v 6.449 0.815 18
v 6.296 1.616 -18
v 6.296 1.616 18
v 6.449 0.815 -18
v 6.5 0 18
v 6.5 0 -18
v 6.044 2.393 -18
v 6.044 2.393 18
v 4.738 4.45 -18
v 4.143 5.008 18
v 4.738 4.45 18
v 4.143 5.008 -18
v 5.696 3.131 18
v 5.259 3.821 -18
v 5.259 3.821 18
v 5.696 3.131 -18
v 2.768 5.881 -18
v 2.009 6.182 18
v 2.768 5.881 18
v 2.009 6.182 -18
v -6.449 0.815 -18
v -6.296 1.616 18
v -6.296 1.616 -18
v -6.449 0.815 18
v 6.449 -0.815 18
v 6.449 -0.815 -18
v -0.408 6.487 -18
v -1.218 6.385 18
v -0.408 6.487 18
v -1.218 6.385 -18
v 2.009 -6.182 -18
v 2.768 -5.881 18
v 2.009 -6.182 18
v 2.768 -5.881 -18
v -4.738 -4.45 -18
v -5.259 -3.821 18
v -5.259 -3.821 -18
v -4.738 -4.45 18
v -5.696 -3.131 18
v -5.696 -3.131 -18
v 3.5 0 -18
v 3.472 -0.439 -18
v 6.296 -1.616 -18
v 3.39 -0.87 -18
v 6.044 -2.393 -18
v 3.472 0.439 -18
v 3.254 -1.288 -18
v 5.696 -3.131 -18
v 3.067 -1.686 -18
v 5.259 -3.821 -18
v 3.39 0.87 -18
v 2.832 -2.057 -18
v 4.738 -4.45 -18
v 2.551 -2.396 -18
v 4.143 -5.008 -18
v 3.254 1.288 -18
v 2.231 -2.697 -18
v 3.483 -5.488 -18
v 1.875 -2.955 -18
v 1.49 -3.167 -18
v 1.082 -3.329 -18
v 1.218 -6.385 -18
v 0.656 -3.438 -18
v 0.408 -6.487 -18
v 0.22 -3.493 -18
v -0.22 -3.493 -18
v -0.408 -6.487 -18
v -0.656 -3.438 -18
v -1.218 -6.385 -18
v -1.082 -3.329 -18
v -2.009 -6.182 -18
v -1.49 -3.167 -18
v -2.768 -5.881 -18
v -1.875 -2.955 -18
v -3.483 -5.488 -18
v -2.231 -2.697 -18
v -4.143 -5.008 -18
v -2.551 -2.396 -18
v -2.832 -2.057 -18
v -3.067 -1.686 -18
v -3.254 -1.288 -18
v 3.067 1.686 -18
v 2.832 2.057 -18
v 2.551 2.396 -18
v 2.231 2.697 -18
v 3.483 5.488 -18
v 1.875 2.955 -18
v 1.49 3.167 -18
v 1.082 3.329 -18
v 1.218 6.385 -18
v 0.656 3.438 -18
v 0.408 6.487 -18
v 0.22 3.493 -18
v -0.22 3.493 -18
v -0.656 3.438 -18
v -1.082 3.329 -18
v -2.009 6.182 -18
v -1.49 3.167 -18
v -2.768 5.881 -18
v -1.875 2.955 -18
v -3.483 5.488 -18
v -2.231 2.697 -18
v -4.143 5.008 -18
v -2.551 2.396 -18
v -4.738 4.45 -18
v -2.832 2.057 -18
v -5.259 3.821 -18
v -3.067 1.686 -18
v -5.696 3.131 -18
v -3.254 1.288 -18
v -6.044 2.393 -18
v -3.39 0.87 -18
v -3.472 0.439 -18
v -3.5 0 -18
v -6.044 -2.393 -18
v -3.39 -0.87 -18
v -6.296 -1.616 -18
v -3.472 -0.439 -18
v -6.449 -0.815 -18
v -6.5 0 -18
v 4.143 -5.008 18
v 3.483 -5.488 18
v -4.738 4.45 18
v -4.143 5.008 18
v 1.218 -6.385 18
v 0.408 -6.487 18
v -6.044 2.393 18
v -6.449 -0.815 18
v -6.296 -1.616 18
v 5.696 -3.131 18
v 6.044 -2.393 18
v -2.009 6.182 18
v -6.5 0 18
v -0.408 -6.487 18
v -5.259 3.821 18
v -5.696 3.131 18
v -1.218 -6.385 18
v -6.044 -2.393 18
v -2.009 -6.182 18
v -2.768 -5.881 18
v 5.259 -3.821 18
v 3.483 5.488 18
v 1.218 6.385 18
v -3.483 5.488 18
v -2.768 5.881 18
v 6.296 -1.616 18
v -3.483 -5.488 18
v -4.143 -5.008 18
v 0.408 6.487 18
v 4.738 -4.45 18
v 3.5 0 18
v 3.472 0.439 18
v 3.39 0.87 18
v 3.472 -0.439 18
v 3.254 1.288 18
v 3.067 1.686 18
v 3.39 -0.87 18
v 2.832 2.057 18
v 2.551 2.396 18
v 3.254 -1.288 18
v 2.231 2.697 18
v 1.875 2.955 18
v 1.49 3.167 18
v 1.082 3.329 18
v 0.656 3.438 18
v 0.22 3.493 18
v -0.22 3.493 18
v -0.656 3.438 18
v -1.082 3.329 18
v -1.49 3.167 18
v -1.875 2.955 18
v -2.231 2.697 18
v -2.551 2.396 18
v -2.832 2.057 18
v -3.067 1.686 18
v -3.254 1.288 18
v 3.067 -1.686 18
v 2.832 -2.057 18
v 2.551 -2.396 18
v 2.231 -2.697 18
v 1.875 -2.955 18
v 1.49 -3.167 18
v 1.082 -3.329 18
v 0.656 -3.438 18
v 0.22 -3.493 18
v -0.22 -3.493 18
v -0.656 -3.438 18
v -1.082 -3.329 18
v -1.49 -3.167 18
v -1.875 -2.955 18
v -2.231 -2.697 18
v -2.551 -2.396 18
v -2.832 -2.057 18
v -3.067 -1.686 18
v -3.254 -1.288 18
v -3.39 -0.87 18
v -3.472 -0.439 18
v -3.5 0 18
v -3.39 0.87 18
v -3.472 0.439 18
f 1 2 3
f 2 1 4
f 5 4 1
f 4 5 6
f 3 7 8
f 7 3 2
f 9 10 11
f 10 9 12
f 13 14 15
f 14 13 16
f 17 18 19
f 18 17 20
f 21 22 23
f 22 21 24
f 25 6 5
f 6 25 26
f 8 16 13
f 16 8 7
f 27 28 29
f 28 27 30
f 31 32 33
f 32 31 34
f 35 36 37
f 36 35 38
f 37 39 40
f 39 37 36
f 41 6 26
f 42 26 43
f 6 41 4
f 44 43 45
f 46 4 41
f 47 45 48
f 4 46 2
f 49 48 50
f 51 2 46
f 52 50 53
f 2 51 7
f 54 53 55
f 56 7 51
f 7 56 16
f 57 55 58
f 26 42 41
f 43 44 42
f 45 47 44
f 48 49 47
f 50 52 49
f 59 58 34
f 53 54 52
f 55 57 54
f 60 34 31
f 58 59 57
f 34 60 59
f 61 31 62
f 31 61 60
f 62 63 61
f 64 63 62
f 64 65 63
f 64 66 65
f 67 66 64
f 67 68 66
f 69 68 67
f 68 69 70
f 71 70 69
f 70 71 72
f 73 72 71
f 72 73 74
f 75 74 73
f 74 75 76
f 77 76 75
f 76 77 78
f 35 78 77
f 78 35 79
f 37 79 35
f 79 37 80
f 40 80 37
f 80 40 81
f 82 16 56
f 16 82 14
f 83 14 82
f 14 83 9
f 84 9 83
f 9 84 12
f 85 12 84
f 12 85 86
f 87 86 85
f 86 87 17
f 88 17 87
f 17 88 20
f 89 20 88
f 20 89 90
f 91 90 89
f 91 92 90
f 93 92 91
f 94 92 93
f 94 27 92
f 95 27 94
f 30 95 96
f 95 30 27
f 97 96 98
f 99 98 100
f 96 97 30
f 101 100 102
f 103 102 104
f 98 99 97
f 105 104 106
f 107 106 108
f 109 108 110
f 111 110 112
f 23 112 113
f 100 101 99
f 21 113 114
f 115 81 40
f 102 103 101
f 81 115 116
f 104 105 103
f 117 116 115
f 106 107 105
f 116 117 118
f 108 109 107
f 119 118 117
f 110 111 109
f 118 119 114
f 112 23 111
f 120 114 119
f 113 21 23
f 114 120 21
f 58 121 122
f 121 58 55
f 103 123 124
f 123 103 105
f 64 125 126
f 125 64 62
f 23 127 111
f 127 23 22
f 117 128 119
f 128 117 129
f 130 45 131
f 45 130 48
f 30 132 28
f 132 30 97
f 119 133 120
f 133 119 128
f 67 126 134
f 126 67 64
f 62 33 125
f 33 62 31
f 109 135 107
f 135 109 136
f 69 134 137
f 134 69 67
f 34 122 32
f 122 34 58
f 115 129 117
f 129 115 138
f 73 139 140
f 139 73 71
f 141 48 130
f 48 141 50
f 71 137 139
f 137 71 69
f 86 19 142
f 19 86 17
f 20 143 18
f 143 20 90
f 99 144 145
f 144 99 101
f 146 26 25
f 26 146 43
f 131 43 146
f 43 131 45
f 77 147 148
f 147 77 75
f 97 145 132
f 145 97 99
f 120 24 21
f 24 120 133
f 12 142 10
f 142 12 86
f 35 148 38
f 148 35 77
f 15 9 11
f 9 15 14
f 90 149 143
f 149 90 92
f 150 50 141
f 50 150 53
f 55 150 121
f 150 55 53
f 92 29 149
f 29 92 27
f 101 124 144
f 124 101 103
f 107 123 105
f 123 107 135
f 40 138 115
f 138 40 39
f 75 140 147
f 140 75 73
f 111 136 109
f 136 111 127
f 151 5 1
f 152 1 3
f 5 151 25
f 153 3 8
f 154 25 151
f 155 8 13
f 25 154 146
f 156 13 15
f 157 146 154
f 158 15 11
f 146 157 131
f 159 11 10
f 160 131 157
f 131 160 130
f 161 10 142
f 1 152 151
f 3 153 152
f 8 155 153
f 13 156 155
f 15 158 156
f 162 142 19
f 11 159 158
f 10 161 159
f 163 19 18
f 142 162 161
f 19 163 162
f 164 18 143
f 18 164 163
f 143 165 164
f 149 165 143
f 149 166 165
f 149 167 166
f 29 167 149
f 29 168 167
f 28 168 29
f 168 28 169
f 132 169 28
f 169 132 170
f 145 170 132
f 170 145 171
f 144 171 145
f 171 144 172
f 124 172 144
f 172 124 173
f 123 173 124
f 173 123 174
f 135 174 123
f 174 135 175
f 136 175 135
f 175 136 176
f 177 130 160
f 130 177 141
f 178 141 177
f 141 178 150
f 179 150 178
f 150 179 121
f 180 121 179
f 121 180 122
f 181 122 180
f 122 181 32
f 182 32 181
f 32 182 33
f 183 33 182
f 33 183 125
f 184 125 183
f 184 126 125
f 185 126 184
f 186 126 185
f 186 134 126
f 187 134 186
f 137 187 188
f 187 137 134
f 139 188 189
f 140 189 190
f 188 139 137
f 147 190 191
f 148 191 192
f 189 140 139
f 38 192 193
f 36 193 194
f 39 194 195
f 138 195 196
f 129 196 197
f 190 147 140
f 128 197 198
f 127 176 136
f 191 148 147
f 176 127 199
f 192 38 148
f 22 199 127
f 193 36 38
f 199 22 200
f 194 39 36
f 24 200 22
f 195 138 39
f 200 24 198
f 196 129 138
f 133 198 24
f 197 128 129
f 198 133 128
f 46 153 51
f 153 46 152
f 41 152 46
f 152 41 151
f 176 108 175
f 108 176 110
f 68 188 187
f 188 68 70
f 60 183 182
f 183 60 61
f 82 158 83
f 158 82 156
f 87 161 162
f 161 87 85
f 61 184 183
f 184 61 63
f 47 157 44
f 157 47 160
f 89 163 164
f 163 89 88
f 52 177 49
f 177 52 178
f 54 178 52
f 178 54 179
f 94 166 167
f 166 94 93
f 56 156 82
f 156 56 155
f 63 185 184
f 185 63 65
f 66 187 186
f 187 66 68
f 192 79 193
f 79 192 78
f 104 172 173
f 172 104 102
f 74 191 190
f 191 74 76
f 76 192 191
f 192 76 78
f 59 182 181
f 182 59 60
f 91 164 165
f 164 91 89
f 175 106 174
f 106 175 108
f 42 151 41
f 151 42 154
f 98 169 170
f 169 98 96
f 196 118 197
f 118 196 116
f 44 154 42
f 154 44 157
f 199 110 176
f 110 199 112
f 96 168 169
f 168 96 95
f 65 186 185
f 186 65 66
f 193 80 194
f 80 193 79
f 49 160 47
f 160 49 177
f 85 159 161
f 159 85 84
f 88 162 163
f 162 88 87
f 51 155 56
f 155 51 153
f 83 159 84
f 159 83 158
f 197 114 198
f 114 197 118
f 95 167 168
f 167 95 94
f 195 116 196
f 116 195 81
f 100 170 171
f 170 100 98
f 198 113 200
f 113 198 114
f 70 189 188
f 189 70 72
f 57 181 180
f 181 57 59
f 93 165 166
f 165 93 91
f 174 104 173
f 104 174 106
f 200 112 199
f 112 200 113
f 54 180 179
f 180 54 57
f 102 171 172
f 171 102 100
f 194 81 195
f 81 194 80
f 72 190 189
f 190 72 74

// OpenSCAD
$fn = 50;


difference() {
	union() {
		translate(v = [0, 0, -18.0000000000]) {
			cylinder(h = 36, r = 6.5000000000);
		}
	}
	union() {
		translate(v = [0, 0, -100.0000000000]) {
			cylinder(h = 200, r = 3.5000000000);
		}
	}
}
